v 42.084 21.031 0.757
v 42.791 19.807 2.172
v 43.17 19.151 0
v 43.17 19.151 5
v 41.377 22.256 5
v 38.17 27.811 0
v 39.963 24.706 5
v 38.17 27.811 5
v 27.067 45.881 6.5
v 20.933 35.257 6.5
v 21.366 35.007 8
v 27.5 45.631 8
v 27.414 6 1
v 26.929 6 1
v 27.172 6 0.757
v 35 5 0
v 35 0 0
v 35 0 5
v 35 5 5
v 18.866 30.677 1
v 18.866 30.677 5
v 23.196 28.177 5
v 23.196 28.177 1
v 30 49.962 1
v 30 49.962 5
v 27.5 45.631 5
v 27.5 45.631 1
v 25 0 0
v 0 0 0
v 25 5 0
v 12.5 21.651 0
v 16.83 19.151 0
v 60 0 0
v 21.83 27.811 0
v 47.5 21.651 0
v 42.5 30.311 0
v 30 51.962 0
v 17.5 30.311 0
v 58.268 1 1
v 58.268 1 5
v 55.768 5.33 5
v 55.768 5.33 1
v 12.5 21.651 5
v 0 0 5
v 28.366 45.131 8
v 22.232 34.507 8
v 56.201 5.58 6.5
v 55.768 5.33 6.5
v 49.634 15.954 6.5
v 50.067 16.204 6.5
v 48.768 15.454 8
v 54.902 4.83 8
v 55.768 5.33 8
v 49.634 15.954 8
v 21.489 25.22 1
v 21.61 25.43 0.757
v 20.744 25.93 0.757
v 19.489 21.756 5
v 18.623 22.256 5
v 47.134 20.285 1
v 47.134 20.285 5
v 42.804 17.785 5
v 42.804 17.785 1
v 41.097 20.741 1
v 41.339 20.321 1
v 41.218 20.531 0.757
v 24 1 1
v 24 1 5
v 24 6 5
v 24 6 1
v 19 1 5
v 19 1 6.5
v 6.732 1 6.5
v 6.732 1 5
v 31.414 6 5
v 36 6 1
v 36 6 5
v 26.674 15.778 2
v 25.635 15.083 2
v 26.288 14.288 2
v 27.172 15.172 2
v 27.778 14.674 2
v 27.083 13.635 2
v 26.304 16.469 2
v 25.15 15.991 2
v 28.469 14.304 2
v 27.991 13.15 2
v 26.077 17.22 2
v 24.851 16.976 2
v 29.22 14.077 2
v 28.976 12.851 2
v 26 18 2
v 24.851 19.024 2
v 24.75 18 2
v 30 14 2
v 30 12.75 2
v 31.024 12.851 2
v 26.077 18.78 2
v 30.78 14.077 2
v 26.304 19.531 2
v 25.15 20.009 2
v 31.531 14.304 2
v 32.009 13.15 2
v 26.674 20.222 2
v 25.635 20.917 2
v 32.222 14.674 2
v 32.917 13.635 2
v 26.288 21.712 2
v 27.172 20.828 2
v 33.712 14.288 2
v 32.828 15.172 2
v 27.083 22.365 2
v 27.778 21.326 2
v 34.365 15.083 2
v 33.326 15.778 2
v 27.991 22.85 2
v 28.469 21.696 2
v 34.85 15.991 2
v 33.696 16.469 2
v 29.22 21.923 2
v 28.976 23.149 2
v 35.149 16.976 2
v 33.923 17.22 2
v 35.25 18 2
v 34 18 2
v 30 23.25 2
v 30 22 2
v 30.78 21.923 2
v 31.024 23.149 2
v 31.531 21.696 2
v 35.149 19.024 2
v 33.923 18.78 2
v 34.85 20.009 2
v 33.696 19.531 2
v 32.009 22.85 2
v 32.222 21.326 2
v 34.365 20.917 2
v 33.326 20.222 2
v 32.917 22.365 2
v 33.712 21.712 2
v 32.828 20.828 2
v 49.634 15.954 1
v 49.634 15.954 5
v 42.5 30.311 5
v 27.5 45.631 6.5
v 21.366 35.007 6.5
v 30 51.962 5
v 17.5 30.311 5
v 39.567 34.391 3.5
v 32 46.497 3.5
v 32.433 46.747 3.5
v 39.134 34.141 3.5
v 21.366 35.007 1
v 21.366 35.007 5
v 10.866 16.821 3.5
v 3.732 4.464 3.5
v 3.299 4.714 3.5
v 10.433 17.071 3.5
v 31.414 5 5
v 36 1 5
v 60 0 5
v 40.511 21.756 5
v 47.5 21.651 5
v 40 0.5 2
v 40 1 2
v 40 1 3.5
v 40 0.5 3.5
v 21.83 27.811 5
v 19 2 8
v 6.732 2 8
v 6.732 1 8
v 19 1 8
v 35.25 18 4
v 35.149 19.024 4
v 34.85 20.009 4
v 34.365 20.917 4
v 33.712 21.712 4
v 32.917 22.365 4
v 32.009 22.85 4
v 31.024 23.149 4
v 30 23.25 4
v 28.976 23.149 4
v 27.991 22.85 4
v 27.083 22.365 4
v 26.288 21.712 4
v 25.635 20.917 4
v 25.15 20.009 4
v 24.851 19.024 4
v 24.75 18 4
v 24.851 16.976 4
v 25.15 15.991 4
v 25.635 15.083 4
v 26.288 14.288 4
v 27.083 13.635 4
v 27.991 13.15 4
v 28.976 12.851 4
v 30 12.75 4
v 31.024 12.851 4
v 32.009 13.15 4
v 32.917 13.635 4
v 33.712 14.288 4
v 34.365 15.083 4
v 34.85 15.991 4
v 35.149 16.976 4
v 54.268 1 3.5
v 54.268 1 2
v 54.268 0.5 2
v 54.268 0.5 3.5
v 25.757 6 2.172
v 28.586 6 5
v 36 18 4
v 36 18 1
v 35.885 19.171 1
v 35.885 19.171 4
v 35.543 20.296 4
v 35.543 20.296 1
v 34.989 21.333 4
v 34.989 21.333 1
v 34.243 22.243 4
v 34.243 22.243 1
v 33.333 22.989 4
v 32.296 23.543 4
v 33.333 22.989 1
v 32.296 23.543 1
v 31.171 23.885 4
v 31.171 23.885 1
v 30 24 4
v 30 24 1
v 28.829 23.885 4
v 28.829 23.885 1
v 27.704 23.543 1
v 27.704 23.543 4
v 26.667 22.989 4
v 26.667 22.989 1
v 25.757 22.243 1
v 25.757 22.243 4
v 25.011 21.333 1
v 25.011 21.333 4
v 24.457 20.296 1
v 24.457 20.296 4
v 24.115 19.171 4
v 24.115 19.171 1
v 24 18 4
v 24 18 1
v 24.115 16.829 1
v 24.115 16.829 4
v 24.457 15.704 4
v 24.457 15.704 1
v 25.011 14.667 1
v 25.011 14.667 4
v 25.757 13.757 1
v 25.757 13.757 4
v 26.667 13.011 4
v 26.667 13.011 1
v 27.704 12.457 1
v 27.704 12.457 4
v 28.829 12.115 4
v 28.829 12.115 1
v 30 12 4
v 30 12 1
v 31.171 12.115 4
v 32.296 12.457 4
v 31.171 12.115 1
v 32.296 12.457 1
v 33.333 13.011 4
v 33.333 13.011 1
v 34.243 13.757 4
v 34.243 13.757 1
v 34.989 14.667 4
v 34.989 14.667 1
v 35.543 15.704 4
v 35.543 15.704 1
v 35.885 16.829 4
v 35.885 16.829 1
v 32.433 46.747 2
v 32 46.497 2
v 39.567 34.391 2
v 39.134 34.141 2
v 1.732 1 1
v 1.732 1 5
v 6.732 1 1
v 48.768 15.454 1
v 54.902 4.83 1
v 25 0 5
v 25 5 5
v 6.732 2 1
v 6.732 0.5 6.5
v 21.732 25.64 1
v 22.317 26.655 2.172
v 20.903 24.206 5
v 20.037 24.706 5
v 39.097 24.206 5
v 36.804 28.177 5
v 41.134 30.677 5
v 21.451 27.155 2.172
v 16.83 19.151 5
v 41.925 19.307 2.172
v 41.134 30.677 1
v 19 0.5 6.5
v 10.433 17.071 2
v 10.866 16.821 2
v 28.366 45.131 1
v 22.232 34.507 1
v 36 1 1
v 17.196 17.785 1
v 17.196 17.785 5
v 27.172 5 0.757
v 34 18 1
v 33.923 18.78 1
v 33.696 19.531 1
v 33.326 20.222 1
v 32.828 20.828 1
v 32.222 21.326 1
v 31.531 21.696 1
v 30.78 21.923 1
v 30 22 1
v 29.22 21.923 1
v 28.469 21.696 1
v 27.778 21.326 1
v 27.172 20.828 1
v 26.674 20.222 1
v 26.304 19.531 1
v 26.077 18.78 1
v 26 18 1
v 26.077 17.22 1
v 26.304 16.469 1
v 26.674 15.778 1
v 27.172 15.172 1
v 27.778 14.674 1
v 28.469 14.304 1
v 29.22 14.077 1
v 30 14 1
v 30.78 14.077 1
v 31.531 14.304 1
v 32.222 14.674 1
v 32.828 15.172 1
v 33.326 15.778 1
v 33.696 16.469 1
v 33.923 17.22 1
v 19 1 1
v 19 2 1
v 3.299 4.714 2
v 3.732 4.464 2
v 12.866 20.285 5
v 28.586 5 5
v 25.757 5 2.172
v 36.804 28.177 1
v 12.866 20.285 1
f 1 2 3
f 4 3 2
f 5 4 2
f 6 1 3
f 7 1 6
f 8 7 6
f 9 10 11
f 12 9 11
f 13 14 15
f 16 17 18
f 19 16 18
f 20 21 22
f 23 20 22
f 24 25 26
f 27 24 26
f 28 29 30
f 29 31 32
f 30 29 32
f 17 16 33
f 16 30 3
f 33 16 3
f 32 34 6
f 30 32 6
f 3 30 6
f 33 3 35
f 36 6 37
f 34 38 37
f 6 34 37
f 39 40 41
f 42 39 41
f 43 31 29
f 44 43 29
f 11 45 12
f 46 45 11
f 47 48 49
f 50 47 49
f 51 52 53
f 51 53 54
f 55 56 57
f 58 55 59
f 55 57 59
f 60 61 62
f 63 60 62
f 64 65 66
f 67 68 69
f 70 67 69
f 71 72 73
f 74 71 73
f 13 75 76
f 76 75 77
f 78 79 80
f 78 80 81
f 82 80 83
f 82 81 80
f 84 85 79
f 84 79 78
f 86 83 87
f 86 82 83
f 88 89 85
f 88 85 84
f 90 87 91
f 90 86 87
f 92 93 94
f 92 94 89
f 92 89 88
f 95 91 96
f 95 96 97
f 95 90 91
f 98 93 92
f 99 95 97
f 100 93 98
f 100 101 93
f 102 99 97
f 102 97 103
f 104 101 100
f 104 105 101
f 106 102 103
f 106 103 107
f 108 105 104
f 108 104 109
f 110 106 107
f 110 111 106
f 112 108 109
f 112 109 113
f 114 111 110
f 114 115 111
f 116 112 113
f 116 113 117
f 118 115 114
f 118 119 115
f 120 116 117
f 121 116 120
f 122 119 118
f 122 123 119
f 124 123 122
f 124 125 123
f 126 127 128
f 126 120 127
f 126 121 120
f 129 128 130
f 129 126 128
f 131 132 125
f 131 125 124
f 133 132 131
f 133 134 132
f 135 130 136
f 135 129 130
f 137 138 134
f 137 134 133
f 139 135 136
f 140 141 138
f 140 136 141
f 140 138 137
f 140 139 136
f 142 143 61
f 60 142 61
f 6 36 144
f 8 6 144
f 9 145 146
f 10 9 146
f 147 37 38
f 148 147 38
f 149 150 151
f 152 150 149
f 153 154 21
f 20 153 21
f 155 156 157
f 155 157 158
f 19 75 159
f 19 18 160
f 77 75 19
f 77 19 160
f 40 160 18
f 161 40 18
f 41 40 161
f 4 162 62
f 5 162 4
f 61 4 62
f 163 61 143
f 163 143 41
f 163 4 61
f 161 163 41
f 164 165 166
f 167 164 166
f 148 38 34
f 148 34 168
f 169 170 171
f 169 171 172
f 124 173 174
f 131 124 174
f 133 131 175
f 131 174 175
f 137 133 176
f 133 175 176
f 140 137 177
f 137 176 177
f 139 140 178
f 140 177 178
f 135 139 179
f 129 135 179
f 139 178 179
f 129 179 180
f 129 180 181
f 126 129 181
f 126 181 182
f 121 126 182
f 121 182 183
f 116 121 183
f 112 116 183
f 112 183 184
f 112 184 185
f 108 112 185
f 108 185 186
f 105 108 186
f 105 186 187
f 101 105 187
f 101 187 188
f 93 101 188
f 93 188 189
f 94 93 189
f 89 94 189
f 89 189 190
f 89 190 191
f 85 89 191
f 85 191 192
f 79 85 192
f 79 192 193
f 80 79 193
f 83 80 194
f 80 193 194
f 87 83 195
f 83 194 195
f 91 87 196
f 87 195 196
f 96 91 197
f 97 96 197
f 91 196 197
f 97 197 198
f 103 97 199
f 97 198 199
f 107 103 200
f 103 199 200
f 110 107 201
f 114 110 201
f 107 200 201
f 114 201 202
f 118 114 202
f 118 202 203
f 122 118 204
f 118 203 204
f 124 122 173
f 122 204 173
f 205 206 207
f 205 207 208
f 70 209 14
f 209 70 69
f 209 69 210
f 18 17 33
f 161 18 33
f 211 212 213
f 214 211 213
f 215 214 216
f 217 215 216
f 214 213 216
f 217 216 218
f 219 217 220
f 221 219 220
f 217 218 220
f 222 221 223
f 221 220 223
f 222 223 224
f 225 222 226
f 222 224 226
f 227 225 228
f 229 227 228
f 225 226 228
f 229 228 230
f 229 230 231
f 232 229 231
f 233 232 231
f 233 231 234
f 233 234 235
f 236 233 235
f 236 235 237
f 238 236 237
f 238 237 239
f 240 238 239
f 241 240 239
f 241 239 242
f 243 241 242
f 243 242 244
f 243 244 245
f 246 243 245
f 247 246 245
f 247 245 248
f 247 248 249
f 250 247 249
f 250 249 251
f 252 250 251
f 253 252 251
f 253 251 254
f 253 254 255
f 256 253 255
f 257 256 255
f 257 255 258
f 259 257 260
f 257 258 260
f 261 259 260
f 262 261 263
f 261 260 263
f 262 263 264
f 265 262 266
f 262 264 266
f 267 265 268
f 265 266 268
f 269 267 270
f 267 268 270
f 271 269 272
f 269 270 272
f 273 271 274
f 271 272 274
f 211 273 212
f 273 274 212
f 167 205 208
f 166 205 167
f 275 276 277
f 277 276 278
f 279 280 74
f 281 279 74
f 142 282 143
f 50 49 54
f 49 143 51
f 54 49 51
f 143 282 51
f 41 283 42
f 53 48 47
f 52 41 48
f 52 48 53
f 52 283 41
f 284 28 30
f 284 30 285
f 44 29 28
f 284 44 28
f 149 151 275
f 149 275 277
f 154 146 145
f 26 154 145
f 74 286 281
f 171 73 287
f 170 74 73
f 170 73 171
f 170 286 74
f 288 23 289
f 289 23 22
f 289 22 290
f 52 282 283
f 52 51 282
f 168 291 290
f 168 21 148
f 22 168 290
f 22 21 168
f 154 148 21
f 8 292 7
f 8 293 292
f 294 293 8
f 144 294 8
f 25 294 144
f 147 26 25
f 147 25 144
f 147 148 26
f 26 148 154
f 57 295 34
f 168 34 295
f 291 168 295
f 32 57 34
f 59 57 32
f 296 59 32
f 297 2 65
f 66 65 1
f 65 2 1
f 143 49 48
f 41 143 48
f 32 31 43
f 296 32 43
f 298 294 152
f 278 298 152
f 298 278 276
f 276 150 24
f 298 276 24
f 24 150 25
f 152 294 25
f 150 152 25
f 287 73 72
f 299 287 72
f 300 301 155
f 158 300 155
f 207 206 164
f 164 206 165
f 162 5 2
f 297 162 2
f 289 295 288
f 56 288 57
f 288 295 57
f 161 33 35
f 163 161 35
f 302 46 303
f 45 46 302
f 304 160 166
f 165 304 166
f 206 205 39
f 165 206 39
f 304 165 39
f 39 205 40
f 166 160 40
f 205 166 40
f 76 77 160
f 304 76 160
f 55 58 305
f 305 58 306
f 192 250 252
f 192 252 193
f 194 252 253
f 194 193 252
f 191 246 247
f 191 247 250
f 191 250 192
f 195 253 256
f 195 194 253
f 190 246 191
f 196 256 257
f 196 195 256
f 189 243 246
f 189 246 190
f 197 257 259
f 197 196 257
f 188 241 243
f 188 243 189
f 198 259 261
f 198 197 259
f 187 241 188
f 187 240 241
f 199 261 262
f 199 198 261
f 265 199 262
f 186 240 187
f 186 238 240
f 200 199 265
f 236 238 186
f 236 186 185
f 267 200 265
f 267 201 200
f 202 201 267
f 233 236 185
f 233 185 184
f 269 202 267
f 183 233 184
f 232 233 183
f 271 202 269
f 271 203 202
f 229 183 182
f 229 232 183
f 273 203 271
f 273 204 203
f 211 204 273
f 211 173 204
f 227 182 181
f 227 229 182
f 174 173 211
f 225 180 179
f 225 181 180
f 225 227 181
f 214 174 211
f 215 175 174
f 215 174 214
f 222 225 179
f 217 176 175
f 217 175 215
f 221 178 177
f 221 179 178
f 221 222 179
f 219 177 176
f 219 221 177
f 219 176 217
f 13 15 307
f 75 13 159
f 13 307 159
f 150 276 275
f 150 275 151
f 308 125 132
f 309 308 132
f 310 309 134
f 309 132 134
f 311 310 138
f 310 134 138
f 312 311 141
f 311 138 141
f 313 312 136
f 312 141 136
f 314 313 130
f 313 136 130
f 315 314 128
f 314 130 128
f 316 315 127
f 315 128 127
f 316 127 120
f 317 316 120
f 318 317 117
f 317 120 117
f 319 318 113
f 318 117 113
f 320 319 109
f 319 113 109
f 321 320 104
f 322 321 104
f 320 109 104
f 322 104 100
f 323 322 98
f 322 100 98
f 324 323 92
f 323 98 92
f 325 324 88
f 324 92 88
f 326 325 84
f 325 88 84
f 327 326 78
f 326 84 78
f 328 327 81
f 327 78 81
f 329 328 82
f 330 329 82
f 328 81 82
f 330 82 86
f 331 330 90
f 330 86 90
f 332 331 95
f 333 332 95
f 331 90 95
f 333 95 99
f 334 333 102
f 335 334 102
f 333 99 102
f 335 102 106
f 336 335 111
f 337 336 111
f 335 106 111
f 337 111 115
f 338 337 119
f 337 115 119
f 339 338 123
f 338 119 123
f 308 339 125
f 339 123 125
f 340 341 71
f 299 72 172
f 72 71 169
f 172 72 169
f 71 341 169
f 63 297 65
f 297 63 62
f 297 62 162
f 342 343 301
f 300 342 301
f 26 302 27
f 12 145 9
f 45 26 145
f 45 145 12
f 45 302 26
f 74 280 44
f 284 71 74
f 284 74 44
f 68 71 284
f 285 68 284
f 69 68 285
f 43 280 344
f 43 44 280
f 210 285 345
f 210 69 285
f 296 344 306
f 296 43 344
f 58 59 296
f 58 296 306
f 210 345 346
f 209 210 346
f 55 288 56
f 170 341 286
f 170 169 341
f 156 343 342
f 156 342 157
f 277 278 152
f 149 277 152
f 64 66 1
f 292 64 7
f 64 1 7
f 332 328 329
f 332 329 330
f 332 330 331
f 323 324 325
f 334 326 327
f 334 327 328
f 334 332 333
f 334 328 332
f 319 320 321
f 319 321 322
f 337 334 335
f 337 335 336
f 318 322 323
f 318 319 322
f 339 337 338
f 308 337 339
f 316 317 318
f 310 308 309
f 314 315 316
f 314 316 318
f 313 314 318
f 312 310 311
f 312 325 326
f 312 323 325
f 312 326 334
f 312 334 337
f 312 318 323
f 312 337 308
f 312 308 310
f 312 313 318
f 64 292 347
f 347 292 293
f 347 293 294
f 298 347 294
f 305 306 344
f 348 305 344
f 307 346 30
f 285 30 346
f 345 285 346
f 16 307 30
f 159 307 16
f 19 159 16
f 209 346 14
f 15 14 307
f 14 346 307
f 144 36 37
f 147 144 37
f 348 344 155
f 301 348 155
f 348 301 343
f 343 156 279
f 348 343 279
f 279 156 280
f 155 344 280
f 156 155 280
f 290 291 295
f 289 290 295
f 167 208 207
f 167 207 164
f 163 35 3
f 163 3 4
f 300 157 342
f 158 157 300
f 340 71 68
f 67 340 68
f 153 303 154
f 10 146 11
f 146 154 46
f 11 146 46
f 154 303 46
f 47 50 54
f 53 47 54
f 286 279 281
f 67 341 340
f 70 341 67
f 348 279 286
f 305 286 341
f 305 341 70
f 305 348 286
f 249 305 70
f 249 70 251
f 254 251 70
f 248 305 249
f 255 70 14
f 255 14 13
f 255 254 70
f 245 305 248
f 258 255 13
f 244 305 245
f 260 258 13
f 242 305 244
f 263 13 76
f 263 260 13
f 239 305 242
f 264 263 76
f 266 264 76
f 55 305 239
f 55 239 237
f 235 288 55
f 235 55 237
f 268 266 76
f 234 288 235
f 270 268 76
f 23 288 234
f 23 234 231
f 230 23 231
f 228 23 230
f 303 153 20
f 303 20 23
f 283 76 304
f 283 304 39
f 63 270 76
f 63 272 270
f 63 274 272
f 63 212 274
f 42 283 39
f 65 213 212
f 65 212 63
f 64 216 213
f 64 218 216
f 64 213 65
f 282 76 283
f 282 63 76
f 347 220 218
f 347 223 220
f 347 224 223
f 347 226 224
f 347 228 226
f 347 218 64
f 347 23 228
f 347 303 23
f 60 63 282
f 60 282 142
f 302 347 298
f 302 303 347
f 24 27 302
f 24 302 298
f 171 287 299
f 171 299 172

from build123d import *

# Parameters (mm, degrees)
F1_DEPTH     = 10
F2_W         = 10
F2_H         = 10
F3_DEPTH     = 5
F4_W         = 10
F4_H         = 10
F5_DEPTH     = 5
F6_W         = 10
F6_H         = 10
F7_DEPTH     = 5
F9_DEPTH     = 9
F10_DEPTH    = 5
F11_W        = 12.2679491924
F11_H        = 4
F11_H_2      = 3
F12_DEPTH    = 1
F13_W        = 12.2679491924
F13_H        = 4
F13_H_2      = 3
F14_DEPTH    = 1
F15_W        = 12.2679491924
F15_H        = 4
F15_H_2      = 3
F16_DEPTH    = 1
F17_W        = 12.2679491924
F17_H        = 1.5
F18_DEPTH    = 0.5
F19_T1_DEPTH = 20.0531322244
F20_W        = 12.2679491924
F20_H        = 1.5
F21_DEPTH    = 0.5
F22_T1_DEPTH = 20.0531322244
F23_W        = 12.2679491924
F23_H        = 1.5
F24_DEPTH    = 0.5
F25_T1_DEPTH = 20.0531322244
F26_W        = 14.2679491924
F26_H        = 1.5
F27_DEPTH    = 0.5
F28_W        = 14.2679491924
F28_H        = 1.5
F29_DEPTH    = 0.5
F30_W        = 14.2679491924
F30_H        = 1.5
F31_DEPTH    = 0.5
F32_R        = 6
F33_DEPTH    = 4
F34_R        = 5.25
F35_DEPTH    = 3
F36_R        = 4
F37_DEPTH    = 1
F39_DEPTH    = 1
F41_DEPTH    = 1
F43_DEPTH    = 1
F44_DEPTH    = 1


# Not quite as in the source:
# - a fillet or chamfer that OpenCascade refuses, or shapes differently, is made with other operations: its cross-section is extruded or revolved along the edge and cut away or added


with BuildPart() as f1:
    # F0 (on Top) → F1 (new body)
    with BuildSketch(Plane.XY):
        Polygon((30, 51.9615242271), (0, 0), (60, 0), align=None)
    extrude(amount=F1_DEPTH)

    # F2 (on face) → F3 (cut)
    with BuildSketch(Plane.XZ):
        with Locations((30, 5)):
            Rectangle(F2_W, F2_H)
    extrude(amount=-F3_DEPTH, mode=Mode.SUBTRACT)

    # F4 (on face) → F5 (cut)
    with BuildSketch(Plane(origin=(0, 0, 0), x_dir=(-0.5, -0.8660254038, 0), z_dir=(-0.8660254038, 0.5, 0))):
        with Locations((-30, 5)):
            Rectangle(F4_W, F4_H)
    extrude(amount=-F5_DEPTH, mode=Mode.SUBTRACT)

    # F6 (on face) → F7 (cut)
    with BuildSketch(Plane(origin=(45, 25.9807621135, 0), x_dir=(-0.5, 0.8660254038, 0), z_dir=(0.8660254038, 0.5, 0))):
        with Locations((0, 5)):
            Rectangle(F6_W, F6_H)
    extrude(amount=-F7_DEPTH, mode=Mode.SUBTRACT)

    # F8 (on face) → F9 (cut)
    with BuildSketch(Plane.XY.offset(10)):
        Polygon((18.8660254038, 30.6769145362), (23.1961524227, 28.1769145362), (17.1961524227, 17.7846096908), (12.8660254038, 20.2846096908), (1.7320508076, 1), (24, 1), (24, 6), (36, 6), (36, 1), (58.2679491924, 1), (47.1339745962, 20.2846096908), (42.8038475773, 17.7846096908), (36.8038475773, 28.1769145362), (41.1339745962, 30.6769145362), (30, 49.9615242271), align=None)
    extrude(amount=-F9_DEPTH, mode=Mode.SUBTRACT)

    # F10 (cut): a face of the model
    f10_faces = [f1.faces().sort_by_distance(p)[0] for p in [
        (35.7937253933, 2.5, 10),
    ]]
    extrude(f10_faces, amount=-F10_DEPTH, mode=Mode.SUBTRACT)

    # F11 (on face) → F12 (join)
    with BuildSketch(Plane(origin=(0.8660254038, -0.5, 0), x_dir=(0.5, 0.8660254038, 0), z_dir=(0.8660254038, -0.5, 0))):
        with Locations((47.1339745962, 3)):
            Rectangle(F11_W, F11_H)
        with Locations((47.1339745962, 6.5)):
            Rectangle(F11_W, F11_H_2)
    extrude(amount=F12_DEPTH)

    # F13 (on face) → F14 (join)
    with BuildSketch(Plane(origin=(0, 1, 0), x_dir=(-1, 0, 0), z_dir=(0, 1, 0))):
        with Locations((-12.8660254038, 3)):
            Rectangle(F13_W, F13_H)
        with Locations((-12.8660254038, 6.5)):
            Rectangle(F13_W, F13_H_2)
    extrude(amount=F14_DEPTH)

    # F15 (on face) → F16 (join)
    with BuildSketch(Plane(origin=(44.1339745962, 25.4807621135, 0), x_dir=(0.5, -0.8660254038, 0), z_dir=(-0.8660254038, -0.5, 0))):
        with Locations((17.1339745962, 3)):
            Rectangle(F15_W, F15_H)
        with Locations((17.1339745962, 6.5)):
            Rectangle(F15_W, F15_H_2)
    extrude(amount=F16_DEPTH)

    # F17 (on face) → F18 (join)
    with BuildSketch(Plane.XZ.offset(-1)):
        with Locations((12.8660254038, 7.25)):
            Rectangle(F17_W, F17_H)
    extrude(amount=F18_DEPTH)

    # F19: chamfer of 0.5 x 1.5 on 1 edges, made by hand

    # F19_s2 → F19_t1 (cut)
    with BuildSketch(Plane.YZ.offset(2.8394592916)):
        Polygon((0.5, 6.5), (1, 8), (0.5, 8), align=None)
    extrude(amount=F19_T1_DEPTH, mode=Mode.SUBTRACT)

    # F20 (on face) → F21 (join)
    with BuildSketch(Plane(origin=(44.1339745962, 25.4807621135, 0), x_dir=(-0.5, 0.8660254038, 0), z_dir=(0.8660254038, 0.5, 0))):
        with Locations((-17.1339745962, 7.25)):
            Rectangle(F20_W, F20_H)
    extrude(amount=F21_DEPTH)

    # F22: chamfer of 0.5 x 1.5 on 1 edges, made by hand

    # F22_s2 → F22_t1 (cut)
    with BuildSketch(Plane(origin=(3.553704242, -6.1551963022, 0), x_dir=(0, 0, 1), z_dir=(0.5, -0.8660254038, 0))):
        Polygon((6.5, -51.4615242271), (8, -50.9615242271), (8, -51.4615242271), align=None)
    extrude(amount=F22_T1_DEPTH, mode=Mode.SUBTRACT)

    # F23 (on face) → F24 (join)
    with BuildSketch(Plane(origin=(0.8660254038, -0.5, 0), x_dir=(-0.5, -0.8660254038, 0), z_dir=(-0.8660254038, 0.5, 0))):
        with Locations((-47.1339745962, 7.25)):
            Rectangle(F23_W, F23_H)
    extrude(amount=F24_DEPTH)

    # F25: chamfer of 0.5 x 1.5 on 1 edges, made by hand

    # F25_s2 → F25_t1 (cut)
    with BuildSketch(Plane(origin=(18.553704242, 32.1359584158, 0), x_dir=(0, 0, 1), z_dir=(0.5, 0.8660254038, 0))):
        Polygon((6.5, 0.5), (8, 1), (8, 0.5), align=None)
    extrude(amount=F25_T1_DEPTH, mode=Mode.SUBTRACT)

    # F26 (on face) → F27 (cut)
    with BuildSketch(Plane(origin=(44.1339745962, 25.4807621135, 0), x_dir=(0.5, -0.8660254038, 0), z_dir=(-0.8660254038, -0.5, 0))):
        with Locations((-17.1339745962, 2.75)):
            Rectangle(F26_W, F26_H)
    extrude(amount=-F27_DEPTH, mode=Mode.SUBTRACT)

    # F28 (on face) → F29 (cut)
    with BuildSketch(Plane(origin=(0, 1, 0), x_dir=(-1, 0, 0), z_dir=(0, 1, 0))):
        with Locations((-47.1339745962, 2.75)):
            Rectangle(F28_W, F28_H)
    extrude(amount=-F29_DEPTH, mode=Mode.SUBTRACT)

    # F30 (on face) → F31 (cut)
    with BuildSketch(Plane(origin=(0.8660254038, -0.5, 0), x_dir=(0.5, 0.8660254038, 0), z_dir=(0.8660254038, -0.5, 0))):
        with Locations((12.8660254038, 2.75)):
            Rectangle(F30_W, F30_H)
    extrude(amount=-F31_DEPTH, mode=Mode.SUBTRACT)

    # F32 (on face) → F33 (join)
    with BuildSketch(Plane.XY.offset(1)):
        with Locations((30, 18)):
            Circle(F32_R)
    extrude(amount=F33_DEPTH)

    # F34 (on face) → F35 (cut)
    with BuildSketch(Plane.XY.offset(5)):
        with Locations((30, 18)):
            Circle(F34_R)
    extrude(amount=-F35_DEPTH, mode=Mode.SUBTRACT)

    # F36 (on face) → F37 (cut)
    with BuildSketch(Plane.XY.offset(2)):
        with Locations((30, 18)):
            Circle(F36_R)
    extrude(amount=-F37_DEPTH, mode=Mode.SUBTRACT)

    # F38 (on face) → F39 (cut)
    with BuildSketch(Plane.XZ.offset(-5)):
        Polygon((25.7573593129, 2.1715728753), (27.1715728753, 0.7573593129), (31.4142135624, 5), (28.5857864376, 5), align=None)
    extrude(amount=-F39_DEPTH, mode=Mode.SUBTRACT)

    # F40 (on face) → F41 (cut)
    with BuildSketch(Plane(origin=(40.6698729811, 23.4807621135, 0), x_dir=(-0.5, 0.8660254038, 0), z_dir=(0.8660254038, 0.5, 0))):
        Polygon((-4.2426406871, 2.1715728753), (-2.8284271247, 0.7573593129), (1.4142135624, 5), (-1.4142135624, 5), align=None)
    extrude(amount=-F41_DEPTH, mode=Mode.SUBTRACT)

    # F42 (on face) → F43 (cut)
    with BuildSketch(Plane(origin=(4.3301270189, -2.5, 0), x_dir=(-0.5, -0.8660254038, 0), z_dir=(-0.8660254038, 0.5, 0))):
        Polygon((-34.2426406871, 2.1715728753), (-32.8284271247, 0.7573593129), (-28.5857864376, 5), (-31.4142135624, 5), align=None)
    extrude(amount=-F43_DEPTH, mode=Mode.SUBTRACT)

    # F44 (cut): a face of the model
    f44_faces = [f1.faces().sort_by_distance(p)[0] for p in [
        (24.1697056275, 18, 5),
    ]]
    extrude(f44_faces, amount=-F44_DEPTH, mode=Mode.SUBTRACT)


solid = f1.part
